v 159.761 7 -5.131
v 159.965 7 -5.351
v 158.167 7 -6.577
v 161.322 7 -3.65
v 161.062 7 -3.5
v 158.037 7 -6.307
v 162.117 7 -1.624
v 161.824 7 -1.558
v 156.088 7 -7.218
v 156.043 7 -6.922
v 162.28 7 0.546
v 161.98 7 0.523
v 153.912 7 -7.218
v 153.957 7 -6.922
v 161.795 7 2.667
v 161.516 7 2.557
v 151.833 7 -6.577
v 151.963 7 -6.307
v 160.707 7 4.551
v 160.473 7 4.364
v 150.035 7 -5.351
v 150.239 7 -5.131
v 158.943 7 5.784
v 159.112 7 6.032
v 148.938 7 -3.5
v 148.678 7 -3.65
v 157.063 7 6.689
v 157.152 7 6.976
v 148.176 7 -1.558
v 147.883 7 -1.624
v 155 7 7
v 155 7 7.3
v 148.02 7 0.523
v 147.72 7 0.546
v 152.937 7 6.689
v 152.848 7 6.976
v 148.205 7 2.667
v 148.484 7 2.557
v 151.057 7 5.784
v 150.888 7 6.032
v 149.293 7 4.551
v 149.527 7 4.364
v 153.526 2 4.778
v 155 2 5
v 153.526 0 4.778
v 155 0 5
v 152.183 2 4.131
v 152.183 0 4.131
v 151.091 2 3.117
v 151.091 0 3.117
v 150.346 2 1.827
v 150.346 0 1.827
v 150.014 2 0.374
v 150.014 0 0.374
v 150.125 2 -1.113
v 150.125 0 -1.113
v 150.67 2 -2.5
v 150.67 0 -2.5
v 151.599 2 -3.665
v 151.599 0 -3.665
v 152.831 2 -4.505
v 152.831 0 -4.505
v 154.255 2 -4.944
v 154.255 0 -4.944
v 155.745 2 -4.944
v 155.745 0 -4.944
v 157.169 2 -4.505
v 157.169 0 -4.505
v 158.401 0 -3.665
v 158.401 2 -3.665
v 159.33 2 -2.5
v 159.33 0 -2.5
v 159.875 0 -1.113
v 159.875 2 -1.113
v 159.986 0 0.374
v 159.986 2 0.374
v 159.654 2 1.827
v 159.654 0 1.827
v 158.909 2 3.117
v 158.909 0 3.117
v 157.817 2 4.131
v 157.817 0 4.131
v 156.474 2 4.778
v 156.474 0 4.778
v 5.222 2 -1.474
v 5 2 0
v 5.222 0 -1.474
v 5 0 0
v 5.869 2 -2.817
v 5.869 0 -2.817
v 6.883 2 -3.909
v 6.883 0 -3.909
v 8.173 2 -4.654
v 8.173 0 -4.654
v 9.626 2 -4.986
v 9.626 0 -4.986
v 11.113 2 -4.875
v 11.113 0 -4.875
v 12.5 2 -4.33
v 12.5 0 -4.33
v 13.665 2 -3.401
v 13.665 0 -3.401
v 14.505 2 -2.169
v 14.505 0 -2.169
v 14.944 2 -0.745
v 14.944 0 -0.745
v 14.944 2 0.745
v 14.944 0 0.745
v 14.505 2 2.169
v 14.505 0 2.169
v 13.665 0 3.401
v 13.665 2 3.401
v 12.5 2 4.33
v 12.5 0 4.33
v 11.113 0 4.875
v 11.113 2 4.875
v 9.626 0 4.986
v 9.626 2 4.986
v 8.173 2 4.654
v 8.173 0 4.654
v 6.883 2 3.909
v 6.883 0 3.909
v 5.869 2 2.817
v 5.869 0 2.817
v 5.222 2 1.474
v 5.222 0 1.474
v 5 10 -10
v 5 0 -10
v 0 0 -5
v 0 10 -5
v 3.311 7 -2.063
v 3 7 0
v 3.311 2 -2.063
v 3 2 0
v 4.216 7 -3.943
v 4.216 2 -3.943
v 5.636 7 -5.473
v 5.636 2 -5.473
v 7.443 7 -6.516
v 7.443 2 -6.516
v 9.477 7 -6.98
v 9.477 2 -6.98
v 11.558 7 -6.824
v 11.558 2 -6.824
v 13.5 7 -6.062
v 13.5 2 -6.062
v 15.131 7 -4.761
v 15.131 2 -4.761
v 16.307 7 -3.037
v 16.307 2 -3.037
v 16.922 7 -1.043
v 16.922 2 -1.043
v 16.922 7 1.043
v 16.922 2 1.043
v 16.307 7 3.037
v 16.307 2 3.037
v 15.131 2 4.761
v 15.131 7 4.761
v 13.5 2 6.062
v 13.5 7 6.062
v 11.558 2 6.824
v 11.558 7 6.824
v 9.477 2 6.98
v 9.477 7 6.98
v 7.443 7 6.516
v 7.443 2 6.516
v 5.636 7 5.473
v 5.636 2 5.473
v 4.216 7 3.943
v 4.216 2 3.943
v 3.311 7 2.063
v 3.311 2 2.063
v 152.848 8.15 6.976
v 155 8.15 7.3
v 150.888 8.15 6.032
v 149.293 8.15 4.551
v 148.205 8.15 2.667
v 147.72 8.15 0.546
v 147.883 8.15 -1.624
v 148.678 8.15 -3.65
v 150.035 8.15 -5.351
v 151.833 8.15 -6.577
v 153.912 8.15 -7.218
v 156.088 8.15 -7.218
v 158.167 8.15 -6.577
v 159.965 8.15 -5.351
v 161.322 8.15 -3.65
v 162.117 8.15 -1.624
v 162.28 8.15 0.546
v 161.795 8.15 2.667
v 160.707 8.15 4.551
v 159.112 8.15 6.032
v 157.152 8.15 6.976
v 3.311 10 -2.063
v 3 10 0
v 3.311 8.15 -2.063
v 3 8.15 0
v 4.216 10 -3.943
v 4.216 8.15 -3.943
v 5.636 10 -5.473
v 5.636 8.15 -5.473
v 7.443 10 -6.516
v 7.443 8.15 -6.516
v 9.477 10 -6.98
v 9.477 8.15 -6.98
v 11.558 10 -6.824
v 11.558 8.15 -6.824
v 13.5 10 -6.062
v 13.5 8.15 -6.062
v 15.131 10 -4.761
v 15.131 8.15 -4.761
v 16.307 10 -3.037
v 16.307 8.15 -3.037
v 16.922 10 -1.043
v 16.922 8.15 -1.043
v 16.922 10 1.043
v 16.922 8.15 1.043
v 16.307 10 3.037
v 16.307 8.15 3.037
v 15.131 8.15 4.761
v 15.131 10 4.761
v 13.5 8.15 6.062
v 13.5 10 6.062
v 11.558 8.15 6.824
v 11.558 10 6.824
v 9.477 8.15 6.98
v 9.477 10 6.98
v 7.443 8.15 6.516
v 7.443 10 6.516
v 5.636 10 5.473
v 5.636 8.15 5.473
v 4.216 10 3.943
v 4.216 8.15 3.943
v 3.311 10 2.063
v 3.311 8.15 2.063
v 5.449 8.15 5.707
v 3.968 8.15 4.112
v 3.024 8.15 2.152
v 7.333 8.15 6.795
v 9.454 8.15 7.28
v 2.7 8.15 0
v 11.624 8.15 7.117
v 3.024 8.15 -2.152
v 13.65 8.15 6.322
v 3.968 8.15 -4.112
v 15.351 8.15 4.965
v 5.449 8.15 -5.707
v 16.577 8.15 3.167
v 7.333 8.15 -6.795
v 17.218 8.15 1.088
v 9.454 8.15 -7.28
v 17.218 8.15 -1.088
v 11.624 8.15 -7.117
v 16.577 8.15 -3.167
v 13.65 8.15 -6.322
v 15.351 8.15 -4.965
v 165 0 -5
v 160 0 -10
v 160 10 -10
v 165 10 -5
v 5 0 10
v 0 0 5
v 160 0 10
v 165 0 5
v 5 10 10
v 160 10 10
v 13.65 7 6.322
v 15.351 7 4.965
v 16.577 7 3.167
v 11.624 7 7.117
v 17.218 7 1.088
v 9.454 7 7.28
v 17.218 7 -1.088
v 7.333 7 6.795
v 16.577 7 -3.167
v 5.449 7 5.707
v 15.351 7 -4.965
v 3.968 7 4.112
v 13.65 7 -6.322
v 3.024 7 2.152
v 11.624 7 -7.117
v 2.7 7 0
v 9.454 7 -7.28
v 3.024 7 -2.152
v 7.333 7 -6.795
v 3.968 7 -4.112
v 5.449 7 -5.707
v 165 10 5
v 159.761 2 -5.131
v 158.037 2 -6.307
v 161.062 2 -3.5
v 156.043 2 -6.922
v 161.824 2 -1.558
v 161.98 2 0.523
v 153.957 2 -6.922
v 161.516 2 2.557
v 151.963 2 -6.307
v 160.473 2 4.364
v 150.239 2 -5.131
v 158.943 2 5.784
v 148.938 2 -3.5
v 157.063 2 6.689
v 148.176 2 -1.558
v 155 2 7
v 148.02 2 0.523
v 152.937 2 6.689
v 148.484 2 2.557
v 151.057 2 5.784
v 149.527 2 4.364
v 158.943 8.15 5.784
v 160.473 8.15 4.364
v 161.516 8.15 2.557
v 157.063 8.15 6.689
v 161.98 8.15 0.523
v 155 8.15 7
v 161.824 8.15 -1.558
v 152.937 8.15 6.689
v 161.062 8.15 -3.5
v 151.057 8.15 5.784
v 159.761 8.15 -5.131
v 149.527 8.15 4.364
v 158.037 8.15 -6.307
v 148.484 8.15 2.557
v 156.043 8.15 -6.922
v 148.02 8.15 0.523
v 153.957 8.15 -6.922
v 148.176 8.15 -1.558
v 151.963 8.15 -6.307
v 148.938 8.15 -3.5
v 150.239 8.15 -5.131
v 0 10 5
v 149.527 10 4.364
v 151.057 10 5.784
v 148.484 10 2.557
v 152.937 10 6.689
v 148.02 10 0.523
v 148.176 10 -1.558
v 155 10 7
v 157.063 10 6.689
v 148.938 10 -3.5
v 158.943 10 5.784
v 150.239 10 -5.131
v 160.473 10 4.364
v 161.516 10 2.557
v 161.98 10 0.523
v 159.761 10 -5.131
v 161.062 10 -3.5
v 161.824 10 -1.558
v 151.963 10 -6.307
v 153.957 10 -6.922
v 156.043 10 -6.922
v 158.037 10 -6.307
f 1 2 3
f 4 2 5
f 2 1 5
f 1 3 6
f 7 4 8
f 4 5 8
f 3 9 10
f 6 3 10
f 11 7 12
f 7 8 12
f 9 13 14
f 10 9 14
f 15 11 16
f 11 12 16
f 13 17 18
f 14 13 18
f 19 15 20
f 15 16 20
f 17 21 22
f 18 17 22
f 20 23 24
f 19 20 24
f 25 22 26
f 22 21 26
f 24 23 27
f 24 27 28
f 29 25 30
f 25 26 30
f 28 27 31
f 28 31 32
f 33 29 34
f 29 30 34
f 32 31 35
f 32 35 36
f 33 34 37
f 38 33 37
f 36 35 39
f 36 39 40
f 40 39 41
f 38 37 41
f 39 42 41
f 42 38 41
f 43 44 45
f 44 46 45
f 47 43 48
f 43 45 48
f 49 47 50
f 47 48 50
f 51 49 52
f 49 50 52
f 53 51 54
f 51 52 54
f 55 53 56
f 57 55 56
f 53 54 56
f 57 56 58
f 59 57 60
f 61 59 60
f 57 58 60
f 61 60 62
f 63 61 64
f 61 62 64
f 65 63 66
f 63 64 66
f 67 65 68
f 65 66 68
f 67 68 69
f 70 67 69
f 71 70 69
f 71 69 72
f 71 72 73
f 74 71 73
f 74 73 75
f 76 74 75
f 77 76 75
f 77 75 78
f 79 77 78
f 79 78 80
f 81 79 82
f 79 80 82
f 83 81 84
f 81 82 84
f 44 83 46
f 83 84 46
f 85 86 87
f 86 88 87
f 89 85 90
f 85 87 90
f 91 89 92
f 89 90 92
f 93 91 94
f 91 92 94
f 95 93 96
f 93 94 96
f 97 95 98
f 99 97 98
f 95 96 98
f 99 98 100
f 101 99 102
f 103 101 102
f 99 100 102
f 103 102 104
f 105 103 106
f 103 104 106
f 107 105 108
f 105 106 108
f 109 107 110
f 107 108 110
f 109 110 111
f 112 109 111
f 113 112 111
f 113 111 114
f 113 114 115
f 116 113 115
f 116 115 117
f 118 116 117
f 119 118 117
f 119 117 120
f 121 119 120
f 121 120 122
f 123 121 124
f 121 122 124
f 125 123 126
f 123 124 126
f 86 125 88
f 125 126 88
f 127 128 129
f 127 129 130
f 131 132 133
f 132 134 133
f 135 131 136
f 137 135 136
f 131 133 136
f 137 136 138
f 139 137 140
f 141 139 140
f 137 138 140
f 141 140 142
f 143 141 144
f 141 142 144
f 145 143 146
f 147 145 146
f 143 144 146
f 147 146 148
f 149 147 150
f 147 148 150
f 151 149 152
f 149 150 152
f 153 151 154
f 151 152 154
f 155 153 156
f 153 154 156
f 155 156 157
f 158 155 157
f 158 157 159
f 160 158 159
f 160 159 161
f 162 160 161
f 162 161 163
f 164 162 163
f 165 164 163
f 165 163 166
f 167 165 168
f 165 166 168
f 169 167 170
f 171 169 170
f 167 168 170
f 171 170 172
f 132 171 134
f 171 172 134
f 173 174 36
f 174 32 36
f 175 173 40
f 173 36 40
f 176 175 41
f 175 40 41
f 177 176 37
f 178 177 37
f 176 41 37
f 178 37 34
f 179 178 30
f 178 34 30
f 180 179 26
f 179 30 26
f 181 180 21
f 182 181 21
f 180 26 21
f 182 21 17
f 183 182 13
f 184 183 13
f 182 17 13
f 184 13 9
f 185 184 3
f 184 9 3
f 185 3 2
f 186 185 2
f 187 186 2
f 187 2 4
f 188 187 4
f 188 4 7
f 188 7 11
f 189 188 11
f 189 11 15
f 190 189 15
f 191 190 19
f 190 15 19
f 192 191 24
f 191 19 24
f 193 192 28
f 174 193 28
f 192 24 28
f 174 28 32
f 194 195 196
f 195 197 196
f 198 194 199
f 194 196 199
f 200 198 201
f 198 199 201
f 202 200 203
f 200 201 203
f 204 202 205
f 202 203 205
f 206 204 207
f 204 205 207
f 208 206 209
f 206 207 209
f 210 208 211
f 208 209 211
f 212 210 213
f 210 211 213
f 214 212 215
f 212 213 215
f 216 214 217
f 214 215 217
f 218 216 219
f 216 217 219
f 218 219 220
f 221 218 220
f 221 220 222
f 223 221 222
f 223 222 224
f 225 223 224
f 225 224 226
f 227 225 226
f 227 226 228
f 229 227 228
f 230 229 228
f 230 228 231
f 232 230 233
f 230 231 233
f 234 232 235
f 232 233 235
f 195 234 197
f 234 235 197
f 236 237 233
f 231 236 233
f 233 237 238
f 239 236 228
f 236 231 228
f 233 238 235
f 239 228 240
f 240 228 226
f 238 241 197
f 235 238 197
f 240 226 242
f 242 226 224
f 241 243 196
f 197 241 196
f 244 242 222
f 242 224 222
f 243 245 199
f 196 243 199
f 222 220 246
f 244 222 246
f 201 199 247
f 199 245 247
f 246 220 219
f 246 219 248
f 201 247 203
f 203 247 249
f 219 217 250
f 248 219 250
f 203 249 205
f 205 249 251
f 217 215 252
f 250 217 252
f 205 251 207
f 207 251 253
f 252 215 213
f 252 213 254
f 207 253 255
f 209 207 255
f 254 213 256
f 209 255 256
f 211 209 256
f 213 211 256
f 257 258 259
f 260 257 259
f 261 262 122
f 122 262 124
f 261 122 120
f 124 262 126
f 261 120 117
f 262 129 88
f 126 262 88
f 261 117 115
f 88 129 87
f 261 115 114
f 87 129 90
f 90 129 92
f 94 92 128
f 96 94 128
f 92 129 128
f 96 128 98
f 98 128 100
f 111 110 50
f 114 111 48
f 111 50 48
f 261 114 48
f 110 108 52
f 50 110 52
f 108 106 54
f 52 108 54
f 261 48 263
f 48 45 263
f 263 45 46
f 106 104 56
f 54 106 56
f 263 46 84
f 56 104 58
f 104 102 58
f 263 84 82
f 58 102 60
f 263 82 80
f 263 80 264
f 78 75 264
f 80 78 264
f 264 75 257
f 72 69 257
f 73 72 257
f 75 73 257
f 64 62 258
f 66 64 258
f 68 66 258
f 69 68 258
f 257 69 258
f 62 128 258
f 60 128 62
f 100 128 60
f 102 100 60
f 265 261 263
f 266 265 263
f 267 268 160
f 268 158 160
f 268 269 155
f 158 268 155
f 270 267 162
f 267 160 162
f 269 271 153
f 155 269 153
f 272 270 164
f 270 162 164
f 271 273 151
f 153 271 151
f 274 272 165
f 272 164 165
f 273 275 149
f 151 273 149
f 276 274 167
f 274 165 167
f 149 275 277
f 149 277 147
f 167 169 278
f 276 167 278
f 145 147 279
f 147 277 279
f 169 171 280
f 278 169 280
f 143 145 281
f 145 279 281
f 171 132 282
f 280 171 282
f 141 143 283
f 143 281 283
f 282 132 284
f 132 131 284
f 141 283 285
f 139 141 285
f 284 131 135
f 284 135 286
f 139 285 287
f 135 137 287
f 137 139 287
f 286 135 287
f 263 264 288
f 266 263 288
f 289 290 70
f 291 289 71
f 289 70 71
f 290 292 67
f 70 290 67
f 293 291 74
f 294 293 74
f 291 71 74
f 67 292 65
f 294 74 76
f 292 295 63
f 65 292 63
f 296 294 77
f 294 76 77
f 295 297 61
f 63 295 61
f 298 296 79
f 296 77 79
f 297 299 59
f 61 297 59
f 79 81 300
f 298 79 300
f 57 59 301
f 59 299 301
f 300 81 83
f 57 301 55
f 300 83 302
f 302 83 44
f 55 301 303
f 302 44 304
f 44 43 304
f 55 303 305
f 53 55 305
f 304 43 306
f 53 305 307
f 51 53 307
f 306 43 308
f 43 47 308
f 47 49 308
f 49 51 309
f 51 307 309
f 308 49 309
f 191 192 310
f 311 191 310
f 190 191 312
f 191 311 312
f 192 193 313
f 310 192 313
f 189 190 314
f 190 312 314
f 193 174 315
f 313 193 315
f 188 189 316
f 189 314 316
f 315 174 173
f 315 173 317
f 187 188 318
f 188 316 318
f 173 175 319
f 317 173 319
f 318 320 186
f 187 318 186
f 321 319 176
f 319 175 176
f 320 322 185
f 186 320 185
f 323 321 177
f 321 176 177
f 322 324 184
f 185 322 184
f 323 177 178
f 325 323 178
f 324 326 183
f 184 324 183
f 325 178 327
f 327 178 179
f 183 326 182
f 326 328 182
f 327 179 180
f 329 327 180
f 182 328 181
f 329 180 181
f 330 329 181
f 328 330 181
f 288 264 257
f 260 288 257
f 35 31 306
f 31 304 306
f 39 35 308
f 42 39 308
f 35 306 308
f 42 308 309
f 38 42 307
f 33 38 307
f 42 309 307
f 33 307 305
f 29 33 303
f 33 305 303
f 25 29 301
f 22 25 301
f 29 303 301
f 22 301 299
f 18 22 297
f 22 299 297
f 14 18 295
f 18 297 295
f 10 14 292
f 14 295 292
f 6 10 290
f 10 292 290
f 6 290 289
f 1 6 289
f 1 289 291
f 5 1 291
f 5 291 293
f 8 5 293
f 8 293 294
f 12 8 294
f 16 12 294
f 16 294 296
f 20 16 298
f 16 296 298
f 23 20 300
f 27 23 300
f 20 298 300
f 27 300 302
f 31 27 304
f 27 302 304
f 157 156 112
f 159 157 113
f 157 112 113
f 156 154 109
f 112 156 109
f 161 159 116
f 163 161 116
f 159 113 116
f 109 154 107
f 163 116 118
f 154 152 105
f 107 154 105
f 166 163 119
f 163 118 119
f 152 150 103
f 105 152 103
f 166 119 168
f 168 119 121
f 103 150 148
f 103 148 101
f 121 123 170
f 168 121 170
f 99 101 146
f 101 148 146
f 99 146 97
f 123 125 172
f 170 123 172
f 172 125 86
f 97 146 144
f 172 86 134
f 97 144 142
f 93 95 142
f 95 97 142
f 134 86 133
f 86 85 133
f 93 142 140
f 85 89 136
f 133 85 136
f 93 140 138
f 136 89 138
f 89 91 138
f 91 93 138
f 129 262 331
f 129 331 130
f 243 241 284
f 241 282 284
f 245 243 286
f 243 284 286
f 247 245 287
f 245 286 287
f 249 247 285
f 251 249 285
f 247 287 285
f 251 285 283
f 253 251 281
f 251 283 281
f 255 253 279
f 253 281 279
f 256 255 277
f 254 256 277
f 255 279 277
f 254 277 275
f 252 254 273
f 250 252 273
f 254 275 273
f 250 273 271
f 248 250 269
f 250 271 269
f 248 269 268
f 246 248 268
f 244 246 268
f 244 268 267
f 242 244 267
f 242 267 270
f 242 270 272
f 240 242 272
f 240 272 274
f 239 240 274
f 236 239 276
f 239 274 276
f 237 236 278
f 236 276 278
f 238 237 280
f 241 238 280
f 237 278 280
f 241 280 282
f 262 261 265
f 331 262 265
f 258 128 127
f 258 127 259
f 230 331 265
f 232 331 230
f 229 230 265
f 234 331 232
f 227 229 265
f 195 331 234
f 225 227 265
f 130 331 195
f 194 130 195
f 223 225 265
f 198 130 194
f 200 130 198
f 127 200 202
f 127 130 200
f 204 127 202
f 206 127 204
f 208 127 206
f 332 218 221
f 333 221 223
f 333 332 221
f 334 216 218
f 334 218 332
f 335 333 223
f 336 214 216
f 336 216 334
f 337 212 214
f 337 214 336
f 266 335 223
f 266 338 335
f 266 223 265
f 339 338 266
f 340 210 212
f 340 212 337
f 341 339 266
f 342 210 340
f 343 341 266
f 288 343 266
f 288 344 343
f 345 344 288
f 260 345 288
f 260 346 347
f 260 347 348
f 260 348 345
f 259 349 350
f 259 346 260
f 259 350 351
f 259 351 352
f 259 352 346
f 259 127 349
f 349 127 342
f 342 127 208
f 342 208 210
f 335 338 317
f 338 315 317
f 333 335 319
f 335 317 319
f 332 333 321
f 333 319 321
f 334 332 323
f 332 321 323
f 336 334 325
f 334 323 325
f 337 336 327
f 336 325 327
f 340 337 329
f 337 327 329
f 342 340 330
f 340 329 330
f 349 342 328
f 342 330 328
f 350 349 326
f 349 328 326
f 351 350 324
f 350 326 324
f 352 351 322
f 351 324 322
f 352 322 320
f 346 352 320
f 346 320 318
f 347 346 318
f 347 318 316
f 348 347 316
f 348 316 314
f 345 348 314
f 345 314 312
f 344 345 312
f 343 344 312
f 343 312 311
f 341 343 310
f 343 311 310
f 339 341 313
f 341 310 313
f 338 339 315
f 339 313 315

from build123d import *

# Parameters (mm, degrees)
SKETCH1_W           = 165
SKETCH1_H           = 20
BOSS_EXTRUDE1_DEPTH = 10
CHAMFER1_SIZE       = 5


with BuildPart() as part:
    # Sketch1 → Boss-Extrude1 (new body)
    with BuildSketch(Plane(origin=(0, 0, 0), x_dir=(1, 0, 0), z_dir=(0, 1, 0))):
        with Locations((82.5, 0)):
            Rectangle(SKETCH1_W, SKETCH1_H)
    extrude(amount=BOSS_EXTRUDE1_DEPTH)

    # Chamfer1
    chamfer1_edges = [part.edges().sort_by_distance(p)[0] for p in [
        (0, 5, -10),
        (165, 5, -10),
        (165, 5, 10),
        (0, 5, 10),
    ]]
    chamfer(chamfer1_edges, length=CHAMFER1_SIZE)

    # Sketch2 → Cut-Revolve1 (revolve, cut)
    with BuildSketch(Plane.XY):
        Polygon((2.7, 7), (3, 7), (3, 2), (5, 2), (5, 0), (10, 0), (10, 10), (3, 10), (3, 8.15), (2.7, 8.15), align=None)
    revolve(axis=Axis((10, 10, 0), (0, -1, 0)), mode=Mode.SUBTRACT)

    # Sketch7 → Cut-Revolve2 (revolve, cut)
    with BuildSketch(Plane.XY, mode=Mode.PRIVATE) as cut_revolve2_sk:
        Polygon((148, 10), (148, 8.15), (147.7, 8.15), (147.7, 7), (148, 7), (148, 2), (150, 2), (150, 0), (155, 0), (155, 10), align=None)
    revolve(cut_revolve2_sk.sketch.rotate(Axis((155, 10, 0), (0, -1, 0)), 270), axis=Axis((155, 10, 0), (0, -1, 0)), mode=Mode.SUBTRACT)


solid = part.part
